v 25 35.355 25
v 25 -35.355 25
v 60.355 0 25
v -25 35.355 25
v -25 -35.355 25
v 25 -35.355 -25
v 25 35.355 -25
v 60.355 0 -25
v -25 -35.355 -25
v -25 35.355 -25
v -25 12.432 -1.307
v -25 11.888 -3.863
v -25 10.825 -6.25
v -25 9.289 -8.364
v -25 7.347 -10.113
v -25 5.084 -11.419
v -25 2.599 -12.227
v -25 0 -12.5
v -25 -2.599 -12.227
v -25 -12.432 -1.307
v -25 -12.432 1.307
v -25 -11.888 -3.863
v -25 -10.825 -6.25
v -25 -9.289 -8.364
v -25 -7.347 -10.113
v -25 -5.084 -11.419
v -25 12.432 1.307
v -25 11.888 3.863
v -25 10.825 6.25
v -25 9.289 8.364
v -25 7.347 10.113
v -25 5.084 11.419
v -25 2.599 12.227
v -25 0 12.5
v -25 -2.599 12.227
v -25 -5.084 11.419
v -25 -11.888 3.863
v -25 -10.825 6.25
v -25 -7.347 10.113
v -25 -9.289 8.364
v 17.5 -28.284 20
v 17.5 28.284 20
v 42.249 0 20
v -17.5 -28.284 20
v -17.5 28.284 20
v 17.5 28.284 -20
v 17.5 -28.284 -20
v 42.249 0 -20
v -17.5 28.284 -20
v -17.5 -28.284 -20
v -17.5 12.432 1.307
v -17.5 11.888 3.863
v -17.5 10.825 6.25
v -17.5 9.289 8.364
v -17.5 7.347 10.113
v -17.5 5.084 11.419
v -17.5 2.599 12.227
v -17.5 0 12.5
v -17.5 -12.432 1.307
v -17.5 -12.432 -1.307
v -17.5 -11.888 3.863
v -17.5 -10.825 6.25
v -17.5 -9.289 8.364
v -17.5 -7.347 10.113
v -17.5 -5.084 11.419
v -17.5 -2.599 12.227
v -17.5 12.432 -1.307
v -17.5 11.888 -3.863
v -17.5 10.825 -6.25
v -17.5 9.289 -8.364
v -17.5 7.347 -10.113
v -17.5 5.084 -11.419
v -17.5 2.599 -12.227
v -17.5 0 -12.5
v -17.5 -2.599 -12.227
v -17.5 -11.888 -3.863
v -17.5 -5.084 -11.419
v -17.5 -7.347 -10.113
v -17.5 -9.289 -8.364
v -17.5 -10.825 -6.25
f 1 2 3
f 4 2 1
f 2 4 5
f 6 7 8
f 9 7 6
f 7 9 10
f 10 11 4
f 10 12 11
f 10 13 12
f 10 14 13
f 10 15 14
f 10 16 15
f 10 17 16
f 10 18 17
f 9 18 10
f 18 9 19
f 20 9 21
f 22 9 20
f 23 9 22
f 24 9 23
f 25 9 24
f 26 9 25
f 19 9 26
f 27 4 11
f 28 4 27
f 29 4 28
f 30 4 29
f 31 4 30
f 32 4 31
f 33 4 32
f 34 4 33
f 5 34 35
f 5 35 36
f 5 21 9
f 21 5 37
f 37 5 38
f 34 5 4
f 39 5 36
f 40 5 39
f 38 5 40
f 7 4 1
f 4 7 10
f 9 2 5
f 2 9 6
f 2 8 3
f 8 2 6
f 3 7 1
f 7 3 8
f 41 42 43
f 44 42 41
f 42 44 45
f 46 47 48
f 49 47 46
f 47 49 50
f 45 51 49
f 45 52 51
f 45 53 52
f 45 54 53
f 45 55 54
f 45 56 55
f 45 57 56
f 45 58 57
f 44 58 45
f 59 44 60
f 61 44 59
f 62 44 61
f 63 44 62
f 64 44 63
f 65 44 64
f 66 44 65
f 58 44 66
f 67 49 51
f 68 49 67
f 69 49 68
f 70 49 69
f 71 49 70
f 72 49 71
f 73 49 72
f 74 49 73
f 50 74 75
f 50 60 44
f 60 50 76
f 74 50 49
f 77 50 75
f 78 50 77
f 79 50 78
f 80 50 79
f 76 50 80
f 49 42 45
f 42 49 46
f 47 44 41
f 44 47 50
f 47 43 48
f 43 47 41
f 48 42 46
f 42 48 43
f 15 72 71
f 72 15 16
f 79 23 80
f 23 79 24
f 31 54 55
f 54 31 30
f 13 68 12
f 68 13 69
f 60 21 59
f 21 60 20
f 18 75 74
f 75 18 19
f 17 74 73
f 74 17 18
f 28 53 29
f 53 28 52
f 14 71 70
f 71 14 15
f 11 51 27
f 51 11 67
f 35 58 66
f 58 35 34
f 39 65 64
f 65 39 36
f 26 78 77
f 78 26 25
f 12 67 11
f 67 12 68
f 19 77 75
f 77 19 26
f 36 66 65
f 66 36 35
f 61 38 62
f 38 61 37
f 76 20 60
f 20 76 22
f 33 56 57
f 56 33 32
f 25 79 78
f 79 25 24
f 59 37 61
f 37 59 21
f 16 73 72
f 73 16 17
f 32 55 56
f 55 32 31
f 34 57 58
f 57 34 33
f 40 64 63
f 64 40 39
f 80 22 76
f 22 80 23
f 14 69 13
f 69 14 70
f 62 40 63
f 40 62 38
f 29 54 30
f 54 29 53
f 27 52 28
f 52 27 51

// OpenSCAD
module shape() {
	union() 
	{
	cube([50,d,50], center=true);

	d = sqrt(2*50*50);
	echo(d);

	translate([25,-d/2, -25])
		rotate([0,0,45])
			cube([50, 50, 50], center=false);
	}
}

shell_th = [0.7, 0.8, 0.8];

difference()
{
	difference()
	{
		shape();
		scale(shell_th)
			shape();
	}
	translate([-75, 0, 0])
	rotate([0, 90, 0])
		cylinder(d=25, h=100);
}
